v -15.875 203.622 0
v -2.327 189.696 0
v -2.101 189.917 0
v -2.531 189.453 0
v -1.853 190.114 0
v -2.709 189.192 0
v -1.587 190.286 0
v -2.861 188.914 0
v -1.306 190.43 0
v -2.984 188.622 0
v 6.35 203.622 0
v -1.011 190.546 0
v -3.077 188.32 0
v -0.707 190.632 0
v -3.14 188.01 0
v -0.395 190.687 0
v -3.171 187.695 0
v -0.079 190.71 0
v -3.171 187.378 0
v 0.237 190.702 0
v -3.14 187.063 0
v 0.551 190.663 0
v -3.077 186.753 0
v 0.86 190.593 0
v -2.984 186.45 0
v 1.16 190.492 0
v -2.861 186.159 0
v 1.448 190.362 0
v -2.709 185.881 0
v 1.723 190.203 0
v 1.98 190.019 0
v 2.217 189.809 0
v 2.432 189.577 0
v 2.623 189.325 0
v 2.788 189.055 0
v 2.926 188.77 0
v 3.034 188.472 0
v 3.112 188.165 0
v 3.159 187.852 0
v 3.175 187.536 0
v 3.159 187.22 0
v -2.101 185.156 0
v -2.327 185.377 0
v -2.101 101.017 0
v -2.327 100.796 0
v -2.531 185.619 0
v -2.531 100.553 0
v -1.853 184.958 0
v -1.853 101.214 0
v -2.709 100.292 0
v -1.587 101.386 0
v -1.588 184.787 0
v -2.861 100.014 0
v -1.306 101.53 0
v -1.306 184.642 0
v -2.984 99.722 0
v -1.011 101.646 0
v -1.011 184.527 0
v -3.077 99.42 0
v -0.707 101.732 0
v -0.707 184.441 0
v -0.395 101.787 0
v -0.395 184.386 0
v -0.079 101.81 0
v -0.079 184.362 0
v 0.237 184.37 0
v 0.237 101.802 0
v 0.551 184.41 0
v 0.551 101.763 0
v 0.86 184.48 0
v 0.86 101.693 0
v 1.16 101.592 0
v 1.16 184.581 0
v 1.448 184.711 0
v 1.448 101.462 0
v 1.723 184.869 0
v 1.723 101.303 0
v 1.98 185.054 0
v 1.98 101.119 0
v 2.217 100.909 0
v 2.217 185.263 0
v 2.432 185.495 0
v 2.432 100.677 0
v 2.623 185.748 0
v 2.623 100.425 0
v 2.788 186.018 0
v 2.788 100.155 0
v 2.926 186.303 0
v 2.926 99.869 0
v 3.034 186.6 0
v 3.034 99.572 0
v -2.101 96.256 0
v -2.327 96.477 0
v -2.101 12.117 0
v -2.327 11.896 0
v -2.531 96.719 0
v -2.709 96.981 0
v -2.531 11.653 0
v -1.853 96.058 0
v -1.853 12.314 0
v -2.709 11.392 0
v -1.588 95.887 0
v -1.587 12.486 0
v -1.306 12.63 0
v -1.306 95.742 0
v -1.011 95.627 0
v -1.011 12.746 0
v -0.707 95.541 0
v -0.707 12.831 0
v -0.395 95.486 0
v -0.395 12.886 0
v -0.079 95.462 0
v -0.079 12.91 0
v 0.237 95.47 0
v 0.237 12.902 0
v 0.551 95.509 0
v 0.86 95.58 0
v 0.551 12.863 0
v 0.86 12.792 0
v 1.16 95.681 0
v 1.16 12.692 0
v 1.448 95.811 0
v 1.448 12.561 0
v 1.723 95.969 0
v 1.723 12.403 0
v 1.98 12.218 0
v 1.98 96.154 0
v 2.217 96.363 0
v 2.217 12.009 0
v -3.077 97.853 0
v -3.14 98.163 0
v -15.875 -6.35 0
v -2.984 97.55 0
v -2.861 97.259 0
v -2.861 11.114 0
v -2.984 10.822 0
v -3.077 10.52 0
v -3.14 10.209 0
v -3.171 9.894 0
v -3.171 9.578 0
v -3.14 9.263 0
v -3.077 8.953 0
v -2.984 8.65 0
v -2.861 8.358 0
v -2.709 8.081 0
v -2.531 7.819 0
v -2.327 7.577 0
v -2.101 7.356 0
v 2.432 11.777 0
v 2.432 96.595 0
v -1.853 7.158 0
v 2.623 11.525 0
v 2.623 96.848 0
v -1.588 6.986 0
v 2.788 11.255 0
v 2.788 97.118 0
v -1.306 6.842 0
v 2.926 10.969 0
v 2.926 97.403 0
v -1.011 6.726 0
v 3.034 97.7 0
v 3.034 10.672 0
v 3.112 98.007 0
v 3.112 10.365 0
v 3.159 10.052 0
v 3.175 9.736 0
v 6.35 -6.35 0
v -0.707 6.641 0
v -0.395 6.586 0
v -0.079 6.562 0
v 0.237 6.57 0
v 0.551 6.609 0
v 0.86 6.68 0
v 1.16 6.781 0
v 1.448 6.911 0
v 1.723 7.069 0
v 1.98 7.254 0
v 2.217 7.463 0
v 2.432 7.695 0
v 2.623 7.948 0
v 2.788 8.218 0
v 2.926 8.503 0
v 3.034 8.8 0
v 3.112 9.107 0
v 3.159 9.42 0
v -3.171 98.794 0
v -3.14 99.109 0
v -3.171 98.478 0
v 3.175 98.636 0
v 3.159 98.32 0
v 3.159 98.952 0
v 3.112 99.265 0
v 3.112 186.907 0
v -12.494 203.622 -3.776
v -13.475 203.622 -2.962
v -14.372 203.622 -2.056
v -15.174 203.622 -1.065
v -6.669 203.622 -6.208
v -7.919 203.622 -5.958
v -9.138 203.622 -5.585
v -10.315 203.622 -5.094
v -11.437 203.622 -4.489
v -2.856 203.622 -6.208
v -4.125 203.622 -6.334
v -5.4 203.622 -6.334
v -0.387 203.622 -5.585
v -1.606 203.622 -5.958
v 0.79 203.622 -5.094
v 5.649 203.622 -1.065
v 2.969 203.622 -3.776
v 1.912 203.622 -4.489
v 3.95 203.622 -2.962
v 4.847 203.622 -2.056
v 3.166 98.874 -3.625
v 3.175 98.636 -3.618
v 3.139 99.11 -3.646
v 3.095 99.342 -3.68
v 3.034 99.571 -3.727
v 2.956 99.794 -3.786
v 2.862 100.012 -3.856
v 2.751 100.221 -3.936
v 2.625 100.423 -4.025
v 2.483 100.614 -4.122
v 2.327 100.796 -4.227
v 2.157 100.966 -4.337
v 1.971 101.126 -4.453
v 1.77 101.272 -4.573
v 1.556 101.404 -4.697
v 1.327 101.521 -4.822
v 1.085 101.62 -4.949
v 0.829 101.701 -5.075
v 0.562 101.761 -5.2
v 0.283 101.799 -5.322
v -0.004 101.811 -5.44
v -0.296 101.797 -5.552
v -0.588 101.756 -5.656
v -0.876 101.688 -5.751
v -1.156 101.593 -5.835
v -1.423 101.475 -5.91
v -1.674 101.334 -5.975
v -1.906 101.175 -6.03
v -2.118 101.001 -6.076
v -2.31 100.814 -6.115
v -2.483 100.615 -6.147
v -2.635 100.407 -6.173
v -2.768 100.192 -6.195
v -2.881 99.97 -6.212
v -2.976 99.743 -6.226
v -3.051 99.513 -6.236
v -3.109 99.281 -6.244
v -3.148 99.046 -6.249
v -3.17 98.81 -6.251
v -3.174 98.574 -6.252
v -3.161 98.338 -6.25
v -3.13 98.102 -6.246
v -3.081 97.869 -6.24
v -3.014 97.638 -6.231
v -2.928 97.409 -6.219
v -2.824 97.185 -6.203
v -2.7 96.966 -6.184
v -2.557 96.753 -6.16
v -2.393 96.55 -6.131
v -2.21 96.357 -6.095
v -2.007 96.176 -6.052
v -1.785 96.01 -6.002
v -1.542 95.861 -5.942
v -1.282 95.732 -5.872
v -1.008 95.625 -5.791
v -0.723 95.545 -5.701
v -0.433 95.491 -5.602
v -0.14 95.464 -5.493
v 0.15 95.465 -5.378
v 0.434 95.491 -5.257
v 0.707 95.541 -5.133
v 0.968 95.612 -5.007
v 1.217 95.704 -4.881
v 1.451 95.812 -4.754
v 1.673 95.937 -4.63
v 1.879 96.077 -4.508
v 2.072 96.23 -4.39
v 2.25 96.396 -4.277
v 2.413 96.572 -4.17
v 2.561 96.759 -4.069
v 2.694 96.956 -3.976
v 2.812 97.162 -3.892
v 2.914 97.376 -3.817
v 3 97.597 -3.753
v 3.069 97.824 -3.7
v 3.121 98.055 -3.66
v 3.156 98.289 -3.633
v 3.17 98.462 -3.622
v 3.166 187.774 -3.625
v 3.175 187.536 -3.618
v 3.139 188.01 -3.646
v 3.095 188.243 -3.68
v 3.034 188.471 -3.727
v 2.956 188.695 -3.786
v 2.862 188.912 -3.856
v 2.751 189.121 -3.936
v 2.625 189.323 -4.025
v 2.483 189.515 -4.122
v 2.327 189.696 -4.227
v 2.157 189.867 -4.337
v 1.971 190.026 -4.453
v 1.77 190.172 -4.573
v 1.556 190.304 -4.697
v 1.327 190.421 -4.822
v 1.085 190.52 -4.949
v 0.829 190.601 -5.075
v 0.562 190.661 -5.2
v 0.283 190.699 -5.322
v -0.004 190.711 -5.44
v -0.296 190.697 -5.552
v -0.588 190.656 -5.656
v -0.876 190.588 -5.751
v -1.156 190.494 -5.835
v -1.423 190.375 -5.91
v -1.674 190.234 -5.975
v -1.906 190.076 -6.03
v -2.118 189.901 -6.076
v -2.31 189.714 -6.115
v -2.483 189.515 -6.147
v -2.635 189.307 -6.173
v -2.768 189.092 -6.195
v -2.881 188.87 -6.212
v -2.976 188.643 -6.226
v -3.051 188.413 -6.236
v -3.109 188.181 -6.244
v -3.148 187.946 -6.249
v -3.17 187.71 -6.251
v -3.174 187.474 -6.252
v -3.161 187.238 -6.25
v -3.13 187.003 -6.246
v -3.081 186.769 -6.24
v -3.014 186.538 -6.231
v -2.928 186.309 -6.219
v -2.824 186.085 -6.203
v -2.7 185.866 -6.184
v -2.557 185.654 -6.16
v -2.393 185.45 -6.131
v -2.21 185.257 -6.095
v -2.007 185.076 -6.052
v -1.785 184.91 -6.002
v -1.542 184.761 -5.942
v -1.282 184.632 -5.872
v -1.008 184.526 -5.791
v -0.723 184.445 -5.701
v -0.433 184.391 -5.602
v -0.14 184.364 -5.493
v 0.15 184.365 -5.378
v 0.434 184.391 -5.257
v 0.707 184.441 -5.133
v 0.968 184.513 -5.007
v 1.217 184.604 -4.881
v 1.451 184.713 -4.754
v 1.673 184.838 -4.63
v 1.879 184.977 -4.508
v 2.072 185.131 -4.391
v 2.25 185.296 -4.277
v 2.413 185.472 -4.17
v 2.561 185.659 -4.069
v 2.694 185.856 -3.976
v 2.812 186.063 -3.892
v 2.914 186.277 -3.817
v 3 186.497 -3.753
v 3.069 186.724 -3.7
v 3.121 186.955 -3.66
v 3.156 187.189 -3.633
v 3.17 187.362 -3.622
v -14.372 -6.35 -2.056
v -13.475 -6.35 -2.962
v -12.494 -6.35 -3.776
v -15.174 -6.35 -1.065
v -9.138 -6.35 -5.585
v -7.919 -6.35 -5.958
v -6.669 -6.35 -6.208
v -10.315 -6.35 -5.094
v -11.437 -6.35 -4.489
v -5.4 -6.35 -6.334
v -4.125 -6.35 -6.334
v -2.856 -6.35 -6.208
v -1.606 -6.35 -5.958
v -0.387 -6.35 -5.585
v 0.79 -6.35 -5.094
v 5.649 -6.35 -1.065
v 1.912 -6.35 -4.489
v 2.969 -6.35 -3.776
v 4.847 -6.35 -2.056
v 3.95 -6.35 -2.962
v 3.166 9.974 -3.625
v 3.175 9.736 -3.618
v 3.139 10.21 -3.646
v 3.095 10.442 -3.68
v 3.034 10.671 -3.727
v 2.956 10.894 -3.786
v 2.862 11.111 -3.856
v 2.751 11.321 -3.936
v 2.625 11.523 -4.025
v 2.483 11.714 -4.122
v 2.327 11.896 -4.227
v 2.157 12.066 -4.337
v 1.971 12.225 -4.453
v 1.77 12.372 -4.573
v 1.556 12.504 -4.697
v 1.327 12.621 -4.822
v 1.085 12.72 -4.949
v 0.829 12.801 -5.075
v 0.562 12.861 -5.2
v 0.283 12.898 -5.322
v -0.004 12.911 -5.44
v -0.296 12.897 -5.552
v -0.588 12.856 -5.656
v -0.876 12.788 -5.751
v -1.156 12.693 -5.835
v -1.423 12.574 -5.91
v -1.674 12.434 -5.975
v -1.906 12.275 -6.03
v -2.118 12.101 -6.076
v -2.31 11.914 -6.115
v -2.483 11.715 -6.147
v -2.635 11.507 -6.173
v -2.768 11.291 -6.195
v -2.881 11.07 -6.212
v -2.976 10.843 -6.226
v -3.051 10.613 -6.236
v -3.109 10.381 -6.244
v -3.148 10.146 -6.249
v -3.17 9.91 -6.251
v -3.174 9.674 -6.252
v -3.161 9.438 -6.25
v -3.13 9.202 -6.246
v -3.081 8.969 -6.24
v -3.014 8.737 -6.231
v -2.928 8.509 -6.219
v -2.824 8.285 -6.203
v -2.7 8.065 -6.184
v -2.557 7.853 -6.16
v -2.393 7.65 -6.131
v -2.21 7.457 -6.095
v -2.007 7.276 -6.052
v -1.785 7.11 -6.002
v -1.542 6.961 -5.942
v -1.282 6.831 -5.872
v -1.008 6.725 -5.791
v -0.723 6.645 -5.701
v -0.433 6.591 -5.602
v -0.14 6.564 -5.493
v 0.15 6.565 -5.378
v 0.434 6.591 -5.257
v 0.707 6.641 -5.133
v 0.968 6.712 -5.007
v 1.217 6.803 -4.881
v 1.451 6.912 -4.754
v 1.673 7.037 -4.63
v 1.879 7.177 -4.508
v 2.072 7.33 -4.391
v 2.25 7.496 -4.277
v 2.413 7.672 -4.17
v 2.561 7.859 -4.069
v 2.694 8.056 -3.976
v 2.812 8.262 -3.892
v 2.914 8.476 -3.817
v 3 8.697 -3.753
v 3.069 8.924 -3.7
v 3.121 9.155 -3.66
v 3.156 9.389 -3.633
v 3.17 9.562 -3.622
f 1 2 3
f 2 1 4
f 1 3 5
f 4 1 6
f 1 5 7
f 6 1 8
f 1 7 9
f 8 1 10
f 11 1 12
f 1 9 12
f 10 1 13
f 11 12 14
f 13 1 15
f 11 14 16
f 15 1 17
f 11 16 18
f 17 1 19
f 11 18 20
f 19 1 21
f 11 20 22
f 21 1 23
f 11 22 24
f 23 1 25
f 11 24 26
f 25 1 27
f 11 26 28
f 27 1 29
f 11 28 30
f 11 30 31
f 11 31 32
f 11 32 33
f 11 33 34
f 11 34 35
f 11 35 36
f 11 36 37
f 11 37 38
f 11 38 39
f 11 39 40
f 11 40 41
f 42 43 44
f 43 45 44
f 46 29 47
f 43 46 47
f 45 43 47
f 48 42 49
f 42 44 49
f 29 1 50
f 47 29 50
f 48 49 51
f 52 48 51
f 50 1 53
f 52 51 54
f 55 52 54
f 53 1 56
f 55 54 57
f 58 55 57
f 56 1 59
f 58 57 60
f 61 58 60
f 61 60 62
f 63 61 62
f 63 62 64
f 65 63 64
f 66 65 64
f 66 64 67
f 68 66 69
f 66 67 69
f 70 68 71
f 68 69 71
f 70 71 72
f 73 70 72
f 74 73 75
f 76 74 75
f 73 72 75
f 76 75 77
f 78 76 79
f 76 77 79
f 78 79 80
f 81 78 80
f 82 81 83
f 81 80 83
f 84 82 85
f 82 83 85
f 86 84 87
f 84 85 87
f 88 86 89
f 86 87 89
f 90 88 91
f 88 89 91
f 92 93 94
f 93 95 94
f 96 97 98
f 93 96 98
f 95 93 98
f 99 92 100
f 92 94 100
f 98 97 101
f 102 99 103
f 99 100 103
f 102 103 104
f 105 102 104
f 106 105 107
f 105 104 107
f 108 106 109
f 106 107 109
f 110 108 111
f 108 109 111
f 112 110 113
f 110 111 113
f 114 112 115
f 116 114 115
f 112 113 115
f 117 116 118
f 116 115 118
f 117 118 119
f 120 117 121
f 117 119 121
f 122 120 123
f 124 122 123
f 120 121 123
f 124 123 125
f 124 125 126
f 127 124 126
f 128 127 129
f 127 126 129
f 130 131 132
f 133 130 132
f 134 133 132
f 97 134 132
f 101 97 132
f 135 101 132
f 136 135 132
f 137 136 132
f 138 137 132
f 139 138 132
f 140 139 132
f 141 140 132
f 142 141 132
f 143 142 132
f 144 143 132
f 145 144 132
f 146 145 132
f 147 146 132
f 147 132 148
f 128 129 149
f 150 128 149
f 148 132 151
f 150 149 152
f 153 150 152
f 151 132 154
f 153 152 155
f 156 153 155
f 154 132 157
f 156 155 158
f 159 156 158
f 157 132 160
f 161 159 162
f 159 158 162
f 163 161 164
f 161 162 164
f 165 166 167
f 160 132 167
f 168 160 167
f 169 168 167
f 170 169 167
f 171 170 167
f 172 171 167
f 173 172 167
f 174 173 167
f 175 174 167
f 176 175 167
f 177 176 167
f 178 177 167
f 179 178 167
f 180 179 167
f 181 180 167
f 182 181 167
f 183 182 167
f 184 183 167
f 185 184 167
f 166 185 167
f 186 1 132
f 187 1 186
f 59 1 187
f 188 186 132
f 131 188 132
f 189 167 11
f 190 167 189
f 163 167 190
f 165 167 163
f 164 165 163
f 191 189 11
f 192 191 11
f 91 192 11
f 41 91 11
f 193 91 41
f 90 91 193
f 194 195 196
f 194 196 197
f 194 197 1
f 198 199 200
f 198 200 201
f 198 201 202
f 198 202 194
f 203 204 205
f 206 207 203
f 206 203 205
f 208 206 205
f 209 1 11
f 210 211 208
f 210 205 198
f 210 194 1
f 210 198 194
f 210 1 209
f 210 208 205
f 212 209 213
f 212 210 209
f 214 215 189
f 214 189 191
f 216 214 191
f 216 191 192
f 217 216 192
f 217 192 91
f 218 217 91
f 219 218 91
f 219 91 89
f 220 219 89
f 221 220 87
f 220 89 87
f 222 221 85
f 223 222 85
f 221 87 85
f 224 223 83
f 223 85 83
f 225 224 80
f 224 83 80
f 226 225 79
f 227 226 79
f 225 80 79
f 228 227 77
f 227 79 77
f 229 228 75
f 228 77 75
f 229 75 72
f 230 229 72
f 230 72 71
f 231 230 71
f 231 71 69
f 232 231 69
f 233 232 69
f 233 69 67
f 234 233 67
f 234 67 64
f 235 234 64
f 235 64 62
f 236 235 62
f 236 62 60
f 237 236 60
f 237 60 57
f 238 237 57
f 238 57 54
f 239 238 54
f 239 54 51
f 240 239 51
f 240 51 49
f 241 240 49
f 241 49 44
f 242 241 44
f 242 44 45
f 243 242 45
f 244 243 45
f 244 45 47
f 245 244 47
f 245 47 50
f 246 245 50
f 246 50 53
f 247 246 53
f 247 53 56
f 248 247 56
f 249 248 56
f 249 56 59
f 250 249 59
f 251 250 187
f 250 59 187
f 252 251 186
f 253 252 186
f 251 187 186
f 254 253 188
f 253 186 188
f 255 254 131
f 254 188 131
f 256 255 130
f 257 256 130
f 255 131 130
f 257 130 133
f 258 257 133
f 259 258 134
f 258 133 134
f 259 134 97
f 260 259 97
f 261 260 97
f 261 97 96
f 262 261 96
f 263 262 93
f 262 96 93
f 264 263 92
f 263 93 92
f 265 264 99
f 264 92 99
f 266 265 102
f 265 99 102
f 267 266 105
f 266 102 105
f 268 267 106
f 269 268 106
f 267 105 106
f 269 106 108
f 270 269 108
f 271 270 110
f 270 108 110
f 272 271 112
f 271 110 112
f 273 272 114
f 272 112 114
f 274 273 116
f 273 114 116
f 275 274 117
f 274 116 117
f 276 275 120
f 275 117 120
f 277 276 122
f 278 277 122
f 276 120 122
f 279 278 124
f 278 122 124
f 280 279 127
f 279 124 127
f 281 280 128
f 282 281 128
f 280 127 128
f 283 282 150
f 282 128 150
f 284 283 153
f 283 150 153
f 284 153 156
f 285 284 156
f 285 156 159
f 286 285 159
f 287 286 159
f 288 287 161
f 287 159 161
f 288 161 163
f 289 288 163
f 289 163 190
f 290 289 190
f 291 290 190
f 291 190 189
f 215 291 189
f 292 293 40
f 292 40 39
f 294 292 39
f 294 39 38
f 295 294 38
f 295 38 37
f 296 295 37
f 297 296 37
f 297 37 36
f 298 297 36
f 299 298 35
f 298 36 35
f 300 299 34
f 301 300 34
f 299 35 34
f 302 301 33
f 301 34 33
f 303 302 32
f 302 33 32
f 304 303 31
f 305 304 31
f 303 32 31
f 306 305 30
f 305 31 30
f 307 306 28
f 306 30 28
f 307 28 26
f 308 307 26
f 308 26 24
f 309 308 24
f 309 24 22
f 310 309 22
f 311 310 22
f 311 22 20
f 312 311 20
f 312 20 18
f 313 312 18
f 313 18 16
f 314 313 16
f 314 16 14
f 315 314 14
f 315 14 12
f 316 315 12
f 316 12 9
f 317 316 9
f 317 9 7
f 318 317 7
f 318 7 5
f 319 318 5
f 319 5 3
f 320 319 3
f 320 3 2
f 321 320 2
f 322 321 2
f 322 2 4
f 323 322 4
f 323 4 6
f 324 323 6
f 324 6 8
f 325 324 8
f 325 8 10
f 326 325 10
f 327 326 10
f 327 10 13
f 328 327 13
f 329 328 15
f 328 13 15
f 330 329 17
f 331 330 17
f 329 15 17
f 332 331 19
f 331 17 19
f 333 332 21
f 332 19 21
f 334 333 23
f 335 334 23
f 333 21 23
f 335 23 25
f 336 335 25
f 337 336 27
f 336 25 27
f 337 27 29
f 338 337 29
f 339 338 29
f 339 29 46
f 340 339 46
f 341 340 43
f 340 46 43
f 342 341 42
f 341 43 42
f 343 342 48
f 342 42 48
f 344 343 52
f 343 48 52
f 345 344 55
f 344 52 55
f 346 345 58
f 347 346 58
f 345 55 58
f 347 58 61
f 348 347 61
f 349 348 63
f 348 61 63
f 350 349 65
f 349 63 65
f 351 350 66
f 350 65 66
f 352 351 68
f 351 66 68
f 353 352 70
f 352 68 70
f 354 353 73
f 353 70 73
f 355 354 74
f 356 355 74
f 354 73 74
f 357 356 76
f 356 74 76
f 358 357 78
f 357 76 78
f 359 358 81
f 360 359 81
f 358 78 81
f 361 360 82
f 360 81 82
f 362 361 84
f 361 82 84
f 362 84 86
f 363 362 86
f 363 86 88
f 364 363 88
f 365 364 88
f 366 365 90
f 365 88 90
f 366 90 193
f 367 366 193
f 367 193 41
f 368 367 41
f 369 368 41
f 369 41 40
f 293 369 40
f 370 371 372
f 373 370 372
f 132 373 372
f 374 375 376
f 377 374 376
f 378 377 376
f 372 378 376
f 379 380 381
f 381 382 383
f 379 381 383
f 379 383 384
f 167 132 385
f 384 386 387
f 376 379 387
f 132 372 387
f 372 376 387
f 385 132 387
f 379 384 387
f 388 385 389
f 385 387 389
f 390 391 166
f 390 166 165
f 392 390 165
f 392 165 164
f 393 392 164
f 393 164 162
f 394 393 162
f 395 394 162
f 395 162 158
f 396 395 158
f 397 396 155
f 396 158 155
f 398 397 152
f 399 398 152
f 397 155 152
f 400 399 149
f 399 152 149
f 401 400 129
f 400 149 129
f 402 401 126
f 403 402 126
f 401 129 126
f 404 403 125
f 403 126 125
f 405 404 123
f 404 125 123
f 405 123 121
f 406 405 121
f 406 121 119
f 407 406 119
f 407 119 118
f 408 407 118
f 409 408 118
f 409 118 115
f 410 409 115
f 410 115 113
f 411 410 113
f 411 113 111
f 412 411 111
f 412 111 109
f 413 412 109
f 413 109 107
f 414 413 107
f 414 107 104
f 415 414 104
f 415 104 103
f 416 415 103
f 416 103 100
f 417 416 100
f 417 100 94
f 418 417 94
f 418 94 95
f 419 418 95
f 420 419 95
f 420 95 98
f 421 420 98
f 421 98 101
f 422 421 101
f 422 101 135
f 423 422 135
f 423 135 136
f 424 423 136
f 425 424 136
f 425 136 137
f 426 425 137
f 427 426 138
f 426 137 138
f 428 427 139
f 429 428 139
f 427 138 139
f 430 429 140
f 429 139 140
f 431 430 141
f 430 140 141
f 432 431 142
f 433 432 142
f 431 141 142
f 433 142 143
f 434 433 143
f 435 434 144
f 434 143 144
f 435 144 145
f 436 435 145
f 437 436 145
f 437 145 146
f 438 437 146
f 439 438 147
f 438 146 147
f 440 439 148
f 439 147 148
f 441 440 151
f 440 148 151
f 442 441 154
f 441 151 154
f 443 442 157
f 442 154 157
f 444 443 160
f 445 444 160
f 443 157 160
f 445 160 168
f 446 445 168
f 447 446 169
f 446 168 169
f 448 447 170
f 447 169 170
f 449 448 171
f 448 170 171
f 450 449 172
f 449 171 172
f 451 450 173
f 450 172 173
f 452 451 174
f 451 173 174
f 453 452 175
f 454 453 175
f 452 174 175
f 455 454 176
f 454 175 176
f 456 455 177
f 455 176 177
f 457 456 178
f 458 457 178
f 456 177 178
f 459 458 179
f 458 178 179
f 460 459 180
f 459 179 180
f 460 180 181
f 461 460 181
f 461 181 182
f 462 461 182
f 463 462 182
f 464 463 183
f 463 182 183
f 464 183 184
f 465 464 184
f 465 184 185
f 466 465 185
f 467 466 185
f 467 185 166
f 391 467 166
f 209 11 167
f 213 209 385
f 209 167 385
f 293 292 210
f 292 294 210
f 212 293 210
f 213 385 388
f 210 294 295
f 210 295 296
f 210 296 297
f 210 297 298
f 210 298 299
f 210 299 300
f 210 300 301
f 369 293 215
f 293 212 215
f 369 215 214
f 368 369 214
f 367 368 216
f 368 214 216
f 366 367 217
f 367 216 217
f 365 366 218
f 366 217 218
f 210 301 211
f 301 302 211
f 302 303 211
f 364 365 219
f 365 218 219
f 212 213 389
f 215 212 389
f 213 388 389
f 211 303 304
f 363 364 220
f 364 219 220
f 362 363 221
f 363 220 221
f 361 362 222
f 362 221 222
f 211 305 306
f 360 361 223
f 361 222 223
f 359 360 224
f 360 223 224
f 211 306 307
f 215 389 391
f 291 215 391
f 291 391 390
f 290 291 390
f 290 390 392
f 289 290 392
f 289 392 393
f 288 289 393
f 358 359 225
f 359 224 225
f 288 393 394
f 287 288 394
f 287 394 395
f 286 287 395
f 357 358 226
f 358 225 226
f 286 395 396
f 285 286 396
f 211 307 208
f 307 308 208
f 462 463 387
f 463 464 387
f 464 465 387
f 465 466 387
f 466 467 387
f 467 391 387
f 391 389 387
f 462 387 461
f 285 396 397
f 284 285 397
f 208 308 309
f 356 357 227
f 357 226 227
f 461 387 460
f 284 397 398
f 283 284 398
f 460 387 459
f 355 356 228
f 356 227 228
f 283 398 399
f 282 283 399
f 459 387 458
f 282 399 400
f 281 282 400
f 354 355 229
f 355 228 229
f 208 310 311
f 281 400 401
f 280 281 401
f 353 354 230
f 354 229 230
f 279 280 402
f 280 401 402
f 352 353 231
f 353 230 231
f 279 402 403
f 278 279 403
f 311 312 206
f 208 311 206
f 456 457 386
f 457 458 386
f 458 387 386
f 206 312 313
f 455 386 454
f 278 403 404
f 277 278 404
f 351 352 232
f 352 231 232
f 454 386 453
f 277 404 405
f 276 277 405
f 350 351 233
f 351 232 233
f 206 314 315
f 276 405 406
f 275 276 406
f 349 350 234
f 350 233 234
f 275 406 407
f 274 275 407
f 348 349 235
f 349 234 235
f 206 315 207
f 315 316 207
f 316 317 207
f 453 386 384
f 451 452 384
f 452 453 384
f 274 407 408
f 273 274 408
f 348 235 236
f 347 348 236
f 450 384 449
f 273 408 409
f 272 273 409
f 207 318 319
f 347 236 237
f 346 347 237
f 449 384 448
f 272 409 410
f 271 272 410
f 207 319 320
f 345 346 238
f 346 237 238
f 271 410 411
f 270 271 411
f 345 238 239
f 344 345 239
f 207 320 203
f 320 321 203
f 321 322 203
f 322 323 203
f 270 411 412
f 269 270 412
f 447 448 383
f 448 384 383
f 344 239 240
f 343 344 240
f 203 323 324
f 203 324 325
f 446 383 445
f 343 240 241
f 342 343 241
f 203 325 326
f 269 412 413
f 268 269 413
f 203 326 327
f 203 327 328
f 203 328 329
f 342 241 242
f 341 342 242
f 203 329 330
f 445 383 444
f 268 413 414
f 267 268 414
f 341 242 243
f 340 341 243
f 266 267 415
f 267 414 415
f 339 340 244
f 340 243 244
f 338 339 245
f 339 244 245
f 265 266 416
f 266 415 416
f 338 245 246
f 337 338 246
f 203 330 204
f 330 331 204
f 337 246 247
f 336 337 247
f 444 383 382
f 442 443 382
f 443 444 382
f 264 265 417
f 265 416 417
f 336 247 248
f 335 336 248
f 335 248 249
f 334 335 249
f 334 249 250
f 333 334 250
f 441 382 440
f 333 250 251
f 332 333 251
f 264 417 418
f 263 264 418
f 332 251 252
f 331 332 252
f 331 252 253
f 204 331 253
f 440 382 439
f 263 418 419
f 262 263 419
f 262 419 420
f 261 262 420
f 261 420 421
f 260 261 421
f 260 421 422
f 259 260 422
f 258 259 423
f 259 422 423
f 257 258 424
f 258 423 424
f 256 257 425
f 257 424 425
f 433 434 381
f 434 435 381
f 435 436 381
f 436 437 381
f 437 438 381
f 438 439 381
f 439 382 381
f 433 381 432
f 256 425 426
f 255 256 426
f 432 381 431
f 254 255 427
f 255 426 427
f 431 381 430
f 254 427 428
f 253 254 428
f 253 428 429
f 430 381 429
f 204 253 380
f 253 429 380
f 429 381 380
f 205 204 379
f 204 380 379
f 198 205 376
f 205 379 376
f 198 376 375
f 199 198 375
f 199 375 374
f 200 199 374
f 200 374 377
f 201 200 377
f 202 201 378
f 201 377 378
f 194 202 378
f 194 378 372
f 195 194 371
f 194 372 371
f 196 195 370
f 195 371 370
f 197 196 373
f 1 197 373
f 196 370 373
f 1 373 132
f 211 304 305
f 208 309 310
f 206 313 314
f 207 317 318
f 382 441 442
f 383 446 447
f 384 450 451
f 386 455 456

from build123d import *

# Parameters (mm, degrees)
BOSS_EXTRUDE1_START     = -6.35
BOSS_EXTRUDE1_DEPTH     = 209.972402
SKETCH1_R               = 3.175
CUT_EXTRUDE2_DEPTH      = 1
CUT_EXTRUDE2_DEPTH_BACK = 7.35


with BuildPart() as part:
    # Sketch2 → Boss-Extrude1 (new body)
    with BuildSketch(Plane(origin=(0, 0, 0), x_dir=(1, 0, 0), z_dir=(0, 1, 0)).offset(BOSS_EXTRUDE1_START)):
        with BuildLine():
            Line((0, 0), (6.35, 0))
            ThreePointArc((6.35, 0), (-4.7625, 6.35), (-15.875, 0))
            Line((-15.875, 0), (0, 0))
        make_face()
    extrude(amount=BOSS_EXTRUDE1_DEPTH)

    # Sketch1 → Cut-Extrude2 (cut, two sides)
    with BuildSketch(Plane.XY) as cut_extrude2_sk:
        with Locations((0, 187.536328)):
            Circle(SKETCH1_R)
        with Locations((0, 9.736074)):
            Circle(SKETCH1_R)
        with Locations((0, 98.636201)):
            Circle(SKETCH1_R)
    extrude(amount=CUT_EXTRUDE2_DEPTH, mode=Mode.SUBTRACT)
    extrude(cut_extrude2_sk.sketch, amount=-CUT_EXTRUDE2_DEPTH_BACK, mode=Mode.SUBTRACT)


solid = part.part
